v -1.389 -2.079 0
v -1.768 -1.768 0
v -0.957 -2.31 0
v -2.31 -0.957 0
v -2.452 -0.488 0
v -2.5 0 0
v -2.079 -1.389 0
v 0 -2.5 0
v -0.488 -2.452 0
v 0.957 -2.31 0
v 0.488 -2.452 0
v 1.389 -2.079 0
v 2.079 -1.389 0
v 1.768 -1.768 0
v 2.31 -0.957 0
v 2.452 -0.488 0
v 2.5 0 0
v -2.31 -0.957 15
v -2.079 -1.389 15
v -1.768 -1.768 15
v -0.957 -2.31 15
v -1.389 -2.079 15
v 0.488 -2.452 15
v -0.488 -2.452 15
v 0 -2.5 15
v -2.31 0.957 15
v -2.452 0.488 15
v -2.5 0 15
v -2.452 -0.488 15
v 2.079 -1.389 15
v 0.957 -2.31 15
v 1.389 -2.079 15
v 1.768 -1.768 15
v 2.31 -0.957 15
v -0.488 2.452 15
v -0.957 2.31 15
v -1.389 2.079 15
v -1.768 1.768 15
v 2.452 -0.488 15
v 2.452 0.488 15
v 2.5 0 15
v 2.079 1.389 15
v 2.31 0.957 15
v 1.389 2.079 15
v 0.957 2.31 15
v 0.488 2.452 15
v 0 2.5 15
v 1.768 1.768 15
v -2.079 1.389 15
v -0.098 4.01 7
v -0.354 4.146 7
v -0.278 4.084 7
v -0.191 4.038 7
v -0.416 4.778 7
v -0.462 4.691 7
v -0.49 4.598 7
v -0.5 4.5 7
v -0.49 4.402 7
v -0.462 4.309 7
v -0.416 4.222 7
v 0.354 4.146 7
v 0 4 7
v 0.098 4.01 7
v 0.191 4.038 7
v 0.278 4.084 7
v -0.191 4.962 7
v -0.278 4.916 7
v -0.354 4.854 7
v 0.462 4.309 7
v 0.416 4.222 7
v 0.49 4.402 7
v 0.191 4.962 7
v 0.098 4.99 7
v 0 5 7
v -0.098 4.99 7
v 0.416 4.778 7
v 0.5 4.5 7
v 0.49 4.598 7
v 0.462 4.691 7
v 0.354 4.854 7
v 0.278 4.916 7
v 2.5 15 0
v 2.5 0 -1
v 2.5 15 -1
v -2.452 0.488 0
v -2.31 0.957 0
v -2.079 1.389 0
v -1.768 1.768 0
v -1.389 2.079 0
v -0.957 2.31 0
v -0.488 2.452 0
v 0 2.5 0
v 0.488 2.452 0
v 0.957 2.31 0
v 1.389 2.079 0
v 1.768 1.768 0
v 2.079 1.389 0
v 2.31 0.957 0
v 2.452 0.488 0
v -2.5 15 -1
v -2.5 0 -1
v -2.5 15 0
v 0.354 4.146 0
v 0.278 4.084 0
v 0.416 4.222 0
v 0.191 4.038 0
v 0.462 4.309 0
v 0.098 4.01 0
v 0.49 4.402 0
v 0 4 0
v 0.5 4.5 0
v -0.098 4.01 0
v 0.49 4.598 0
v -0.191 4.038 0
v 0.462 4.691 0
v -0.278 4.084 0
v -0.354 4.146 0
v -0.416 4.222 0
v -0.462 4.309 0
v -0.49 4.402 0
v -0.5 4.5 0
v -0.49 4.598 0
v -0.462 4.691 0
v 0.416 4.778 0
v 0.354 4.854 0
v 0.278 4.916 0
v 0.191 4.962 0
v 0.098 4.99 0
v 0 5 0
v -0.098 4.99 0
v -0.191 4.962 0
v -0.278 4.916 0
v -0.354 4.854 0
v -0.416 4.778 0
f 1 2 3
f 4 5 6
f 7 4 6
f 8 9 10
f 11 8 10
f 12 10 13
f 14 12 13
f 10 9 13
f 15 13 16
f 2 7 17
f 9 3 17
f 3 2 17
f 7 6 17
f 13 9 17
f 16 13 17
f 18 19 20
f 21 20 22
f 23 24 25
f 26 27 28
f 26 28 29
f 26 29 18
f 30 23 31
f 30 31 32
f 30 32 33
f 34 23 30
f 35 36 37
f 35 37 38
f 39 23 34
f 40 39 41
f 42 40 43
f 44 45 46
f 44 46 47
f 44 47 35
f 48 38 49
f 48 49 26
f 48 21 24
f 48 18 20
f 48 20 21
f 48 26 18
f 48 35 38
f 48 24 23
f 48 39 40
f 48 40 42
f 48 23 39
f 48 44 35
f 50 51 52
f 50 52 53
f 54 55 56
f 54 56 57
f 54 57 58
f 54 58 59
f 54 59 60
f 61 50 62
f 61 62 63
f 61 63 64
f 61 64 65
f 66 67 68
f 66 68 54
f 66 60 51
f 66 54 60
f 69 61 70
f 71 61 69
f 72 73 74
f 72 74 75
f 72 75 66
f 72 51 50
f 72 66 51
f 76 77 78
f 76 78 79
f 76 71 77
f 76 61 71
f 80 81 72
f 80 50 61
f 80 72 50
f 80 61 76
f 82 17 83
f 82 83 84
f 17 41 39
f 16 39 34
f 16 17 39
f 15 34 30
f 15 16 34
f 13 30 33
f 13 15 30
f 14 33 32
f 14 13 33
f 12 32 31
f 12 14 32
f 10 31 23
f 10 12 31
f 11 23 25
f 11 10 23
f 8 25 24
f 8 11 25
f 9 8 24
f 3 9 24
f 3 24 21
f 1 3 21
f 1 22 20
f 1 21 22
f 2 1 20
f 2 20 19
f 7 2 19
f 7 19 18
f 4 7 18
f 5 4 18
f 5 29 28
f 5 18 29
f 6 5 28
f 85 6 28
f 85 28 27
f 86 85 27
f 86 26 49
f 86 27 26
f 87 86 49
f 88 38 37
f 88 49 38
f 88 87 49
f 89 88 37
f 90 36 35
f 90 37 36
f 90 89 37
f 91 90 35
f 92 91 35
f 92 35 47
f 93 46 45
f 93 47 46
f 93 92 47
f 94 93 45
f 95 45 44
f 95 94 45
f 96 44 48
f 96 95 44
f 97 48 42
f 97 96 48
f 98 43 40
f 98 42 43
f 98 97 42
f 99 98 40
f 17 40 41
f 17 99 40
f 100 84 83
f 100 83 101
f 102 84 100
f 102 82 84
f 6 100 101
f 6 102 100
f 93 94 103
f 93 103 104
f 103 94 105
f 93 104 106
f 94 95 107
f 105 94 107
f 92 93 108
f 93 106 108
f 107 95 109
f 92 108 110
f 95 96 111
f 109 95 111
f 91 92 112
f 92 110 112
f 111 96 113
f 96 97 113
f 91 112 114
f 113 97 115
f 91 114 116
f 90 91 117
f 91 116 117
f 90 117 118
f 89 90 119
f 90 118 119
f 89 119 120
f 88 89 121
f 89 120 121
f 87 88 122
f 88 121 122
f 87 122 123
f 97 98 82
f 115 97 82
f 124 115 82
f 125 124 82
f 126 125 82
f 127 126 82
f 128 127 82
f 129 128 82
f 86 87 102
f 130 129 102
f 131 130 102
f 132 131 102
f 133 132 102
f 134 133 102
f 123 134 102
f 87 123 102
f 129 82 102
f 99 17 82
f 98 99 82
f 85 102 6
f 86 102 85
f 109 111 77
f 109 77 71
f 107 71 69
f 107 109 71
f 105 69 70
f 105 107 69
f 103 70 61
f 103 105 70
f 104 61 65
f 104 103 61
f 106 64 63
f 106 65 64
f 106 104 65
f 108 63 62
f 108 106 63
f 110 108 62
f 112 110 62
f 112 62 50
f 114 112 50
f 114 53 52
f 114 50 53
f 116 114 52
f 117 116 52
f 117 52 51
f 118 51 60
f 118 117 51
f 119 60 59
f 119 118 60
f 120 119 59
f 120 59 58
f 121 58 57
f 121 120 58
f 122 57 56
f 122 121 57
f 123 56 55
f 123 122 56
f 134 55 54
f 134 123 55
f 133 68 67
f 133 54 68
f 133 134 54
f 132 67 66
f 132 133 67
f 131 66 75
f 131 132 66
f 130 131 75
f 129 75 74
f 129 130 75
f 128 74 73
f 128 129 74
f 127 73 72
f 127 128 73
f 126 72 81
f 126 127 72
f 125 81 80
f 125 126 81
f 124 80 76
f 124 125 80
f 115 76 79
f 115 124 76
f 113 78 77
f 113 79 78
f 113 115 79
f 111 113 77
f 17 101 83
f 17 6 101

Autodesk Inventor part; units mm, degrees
ref_plane "YZ Plane" through (0, 0, 0) normal (1, 0, 0) x (0, 1, 0)
ref_plane "XZ Plane" through (0, 0, 0) normal (0, 1, 0) x (-1, 0, 0)
ref_plane "XY Plane" through (0, 0, 0) normal (0, 0, 1) x (1, 0, 0)
sketch "Sketch1" plane through (0, 0, 0) normal (0, 0, 1) x (1, 0, 0)
  circle A0 centre (0, 0) radius 2.5
  dimension "d0" = 5
extrude "Extrusion1" add sketch "Sketch1" along normal blind 15
sketch "Sketch2" plane through (0, 0, 0) normal (0, 0, -1) x (-1, 0, 0)
  circle A0 centre (0, 0) radius 2.5 projected
  line L0 (2.5, 0) -> (-2.5, 0)
  line L1 (-2.5, 0) -> (-2.5, 15)
  line L2 (-2.5, 15) -> (2.5, 15)
  line L3 (2.5, 15) -> (2.5, 0)
  dimension "d3" = 15
extrude "Extrusion2" add sketch "Sketch2" along normal blind 1 contours L0 A0 | A0 L1 L2 L3 picked at (0.6238, 0.5526)
sketch "Sketch3" plane through (0, 0, 0) normal (0, 0, 1) x (1, 0, 0)
  circle A0 centre (0, 4.5) radius 0.5
  point P0 (0, 0)
  dimension "d7" = 1
extrude "Extrusion3" add sketch "Sketch3" along normal blind 7
properties part number "pathFollower" material "Stainless Steel"
